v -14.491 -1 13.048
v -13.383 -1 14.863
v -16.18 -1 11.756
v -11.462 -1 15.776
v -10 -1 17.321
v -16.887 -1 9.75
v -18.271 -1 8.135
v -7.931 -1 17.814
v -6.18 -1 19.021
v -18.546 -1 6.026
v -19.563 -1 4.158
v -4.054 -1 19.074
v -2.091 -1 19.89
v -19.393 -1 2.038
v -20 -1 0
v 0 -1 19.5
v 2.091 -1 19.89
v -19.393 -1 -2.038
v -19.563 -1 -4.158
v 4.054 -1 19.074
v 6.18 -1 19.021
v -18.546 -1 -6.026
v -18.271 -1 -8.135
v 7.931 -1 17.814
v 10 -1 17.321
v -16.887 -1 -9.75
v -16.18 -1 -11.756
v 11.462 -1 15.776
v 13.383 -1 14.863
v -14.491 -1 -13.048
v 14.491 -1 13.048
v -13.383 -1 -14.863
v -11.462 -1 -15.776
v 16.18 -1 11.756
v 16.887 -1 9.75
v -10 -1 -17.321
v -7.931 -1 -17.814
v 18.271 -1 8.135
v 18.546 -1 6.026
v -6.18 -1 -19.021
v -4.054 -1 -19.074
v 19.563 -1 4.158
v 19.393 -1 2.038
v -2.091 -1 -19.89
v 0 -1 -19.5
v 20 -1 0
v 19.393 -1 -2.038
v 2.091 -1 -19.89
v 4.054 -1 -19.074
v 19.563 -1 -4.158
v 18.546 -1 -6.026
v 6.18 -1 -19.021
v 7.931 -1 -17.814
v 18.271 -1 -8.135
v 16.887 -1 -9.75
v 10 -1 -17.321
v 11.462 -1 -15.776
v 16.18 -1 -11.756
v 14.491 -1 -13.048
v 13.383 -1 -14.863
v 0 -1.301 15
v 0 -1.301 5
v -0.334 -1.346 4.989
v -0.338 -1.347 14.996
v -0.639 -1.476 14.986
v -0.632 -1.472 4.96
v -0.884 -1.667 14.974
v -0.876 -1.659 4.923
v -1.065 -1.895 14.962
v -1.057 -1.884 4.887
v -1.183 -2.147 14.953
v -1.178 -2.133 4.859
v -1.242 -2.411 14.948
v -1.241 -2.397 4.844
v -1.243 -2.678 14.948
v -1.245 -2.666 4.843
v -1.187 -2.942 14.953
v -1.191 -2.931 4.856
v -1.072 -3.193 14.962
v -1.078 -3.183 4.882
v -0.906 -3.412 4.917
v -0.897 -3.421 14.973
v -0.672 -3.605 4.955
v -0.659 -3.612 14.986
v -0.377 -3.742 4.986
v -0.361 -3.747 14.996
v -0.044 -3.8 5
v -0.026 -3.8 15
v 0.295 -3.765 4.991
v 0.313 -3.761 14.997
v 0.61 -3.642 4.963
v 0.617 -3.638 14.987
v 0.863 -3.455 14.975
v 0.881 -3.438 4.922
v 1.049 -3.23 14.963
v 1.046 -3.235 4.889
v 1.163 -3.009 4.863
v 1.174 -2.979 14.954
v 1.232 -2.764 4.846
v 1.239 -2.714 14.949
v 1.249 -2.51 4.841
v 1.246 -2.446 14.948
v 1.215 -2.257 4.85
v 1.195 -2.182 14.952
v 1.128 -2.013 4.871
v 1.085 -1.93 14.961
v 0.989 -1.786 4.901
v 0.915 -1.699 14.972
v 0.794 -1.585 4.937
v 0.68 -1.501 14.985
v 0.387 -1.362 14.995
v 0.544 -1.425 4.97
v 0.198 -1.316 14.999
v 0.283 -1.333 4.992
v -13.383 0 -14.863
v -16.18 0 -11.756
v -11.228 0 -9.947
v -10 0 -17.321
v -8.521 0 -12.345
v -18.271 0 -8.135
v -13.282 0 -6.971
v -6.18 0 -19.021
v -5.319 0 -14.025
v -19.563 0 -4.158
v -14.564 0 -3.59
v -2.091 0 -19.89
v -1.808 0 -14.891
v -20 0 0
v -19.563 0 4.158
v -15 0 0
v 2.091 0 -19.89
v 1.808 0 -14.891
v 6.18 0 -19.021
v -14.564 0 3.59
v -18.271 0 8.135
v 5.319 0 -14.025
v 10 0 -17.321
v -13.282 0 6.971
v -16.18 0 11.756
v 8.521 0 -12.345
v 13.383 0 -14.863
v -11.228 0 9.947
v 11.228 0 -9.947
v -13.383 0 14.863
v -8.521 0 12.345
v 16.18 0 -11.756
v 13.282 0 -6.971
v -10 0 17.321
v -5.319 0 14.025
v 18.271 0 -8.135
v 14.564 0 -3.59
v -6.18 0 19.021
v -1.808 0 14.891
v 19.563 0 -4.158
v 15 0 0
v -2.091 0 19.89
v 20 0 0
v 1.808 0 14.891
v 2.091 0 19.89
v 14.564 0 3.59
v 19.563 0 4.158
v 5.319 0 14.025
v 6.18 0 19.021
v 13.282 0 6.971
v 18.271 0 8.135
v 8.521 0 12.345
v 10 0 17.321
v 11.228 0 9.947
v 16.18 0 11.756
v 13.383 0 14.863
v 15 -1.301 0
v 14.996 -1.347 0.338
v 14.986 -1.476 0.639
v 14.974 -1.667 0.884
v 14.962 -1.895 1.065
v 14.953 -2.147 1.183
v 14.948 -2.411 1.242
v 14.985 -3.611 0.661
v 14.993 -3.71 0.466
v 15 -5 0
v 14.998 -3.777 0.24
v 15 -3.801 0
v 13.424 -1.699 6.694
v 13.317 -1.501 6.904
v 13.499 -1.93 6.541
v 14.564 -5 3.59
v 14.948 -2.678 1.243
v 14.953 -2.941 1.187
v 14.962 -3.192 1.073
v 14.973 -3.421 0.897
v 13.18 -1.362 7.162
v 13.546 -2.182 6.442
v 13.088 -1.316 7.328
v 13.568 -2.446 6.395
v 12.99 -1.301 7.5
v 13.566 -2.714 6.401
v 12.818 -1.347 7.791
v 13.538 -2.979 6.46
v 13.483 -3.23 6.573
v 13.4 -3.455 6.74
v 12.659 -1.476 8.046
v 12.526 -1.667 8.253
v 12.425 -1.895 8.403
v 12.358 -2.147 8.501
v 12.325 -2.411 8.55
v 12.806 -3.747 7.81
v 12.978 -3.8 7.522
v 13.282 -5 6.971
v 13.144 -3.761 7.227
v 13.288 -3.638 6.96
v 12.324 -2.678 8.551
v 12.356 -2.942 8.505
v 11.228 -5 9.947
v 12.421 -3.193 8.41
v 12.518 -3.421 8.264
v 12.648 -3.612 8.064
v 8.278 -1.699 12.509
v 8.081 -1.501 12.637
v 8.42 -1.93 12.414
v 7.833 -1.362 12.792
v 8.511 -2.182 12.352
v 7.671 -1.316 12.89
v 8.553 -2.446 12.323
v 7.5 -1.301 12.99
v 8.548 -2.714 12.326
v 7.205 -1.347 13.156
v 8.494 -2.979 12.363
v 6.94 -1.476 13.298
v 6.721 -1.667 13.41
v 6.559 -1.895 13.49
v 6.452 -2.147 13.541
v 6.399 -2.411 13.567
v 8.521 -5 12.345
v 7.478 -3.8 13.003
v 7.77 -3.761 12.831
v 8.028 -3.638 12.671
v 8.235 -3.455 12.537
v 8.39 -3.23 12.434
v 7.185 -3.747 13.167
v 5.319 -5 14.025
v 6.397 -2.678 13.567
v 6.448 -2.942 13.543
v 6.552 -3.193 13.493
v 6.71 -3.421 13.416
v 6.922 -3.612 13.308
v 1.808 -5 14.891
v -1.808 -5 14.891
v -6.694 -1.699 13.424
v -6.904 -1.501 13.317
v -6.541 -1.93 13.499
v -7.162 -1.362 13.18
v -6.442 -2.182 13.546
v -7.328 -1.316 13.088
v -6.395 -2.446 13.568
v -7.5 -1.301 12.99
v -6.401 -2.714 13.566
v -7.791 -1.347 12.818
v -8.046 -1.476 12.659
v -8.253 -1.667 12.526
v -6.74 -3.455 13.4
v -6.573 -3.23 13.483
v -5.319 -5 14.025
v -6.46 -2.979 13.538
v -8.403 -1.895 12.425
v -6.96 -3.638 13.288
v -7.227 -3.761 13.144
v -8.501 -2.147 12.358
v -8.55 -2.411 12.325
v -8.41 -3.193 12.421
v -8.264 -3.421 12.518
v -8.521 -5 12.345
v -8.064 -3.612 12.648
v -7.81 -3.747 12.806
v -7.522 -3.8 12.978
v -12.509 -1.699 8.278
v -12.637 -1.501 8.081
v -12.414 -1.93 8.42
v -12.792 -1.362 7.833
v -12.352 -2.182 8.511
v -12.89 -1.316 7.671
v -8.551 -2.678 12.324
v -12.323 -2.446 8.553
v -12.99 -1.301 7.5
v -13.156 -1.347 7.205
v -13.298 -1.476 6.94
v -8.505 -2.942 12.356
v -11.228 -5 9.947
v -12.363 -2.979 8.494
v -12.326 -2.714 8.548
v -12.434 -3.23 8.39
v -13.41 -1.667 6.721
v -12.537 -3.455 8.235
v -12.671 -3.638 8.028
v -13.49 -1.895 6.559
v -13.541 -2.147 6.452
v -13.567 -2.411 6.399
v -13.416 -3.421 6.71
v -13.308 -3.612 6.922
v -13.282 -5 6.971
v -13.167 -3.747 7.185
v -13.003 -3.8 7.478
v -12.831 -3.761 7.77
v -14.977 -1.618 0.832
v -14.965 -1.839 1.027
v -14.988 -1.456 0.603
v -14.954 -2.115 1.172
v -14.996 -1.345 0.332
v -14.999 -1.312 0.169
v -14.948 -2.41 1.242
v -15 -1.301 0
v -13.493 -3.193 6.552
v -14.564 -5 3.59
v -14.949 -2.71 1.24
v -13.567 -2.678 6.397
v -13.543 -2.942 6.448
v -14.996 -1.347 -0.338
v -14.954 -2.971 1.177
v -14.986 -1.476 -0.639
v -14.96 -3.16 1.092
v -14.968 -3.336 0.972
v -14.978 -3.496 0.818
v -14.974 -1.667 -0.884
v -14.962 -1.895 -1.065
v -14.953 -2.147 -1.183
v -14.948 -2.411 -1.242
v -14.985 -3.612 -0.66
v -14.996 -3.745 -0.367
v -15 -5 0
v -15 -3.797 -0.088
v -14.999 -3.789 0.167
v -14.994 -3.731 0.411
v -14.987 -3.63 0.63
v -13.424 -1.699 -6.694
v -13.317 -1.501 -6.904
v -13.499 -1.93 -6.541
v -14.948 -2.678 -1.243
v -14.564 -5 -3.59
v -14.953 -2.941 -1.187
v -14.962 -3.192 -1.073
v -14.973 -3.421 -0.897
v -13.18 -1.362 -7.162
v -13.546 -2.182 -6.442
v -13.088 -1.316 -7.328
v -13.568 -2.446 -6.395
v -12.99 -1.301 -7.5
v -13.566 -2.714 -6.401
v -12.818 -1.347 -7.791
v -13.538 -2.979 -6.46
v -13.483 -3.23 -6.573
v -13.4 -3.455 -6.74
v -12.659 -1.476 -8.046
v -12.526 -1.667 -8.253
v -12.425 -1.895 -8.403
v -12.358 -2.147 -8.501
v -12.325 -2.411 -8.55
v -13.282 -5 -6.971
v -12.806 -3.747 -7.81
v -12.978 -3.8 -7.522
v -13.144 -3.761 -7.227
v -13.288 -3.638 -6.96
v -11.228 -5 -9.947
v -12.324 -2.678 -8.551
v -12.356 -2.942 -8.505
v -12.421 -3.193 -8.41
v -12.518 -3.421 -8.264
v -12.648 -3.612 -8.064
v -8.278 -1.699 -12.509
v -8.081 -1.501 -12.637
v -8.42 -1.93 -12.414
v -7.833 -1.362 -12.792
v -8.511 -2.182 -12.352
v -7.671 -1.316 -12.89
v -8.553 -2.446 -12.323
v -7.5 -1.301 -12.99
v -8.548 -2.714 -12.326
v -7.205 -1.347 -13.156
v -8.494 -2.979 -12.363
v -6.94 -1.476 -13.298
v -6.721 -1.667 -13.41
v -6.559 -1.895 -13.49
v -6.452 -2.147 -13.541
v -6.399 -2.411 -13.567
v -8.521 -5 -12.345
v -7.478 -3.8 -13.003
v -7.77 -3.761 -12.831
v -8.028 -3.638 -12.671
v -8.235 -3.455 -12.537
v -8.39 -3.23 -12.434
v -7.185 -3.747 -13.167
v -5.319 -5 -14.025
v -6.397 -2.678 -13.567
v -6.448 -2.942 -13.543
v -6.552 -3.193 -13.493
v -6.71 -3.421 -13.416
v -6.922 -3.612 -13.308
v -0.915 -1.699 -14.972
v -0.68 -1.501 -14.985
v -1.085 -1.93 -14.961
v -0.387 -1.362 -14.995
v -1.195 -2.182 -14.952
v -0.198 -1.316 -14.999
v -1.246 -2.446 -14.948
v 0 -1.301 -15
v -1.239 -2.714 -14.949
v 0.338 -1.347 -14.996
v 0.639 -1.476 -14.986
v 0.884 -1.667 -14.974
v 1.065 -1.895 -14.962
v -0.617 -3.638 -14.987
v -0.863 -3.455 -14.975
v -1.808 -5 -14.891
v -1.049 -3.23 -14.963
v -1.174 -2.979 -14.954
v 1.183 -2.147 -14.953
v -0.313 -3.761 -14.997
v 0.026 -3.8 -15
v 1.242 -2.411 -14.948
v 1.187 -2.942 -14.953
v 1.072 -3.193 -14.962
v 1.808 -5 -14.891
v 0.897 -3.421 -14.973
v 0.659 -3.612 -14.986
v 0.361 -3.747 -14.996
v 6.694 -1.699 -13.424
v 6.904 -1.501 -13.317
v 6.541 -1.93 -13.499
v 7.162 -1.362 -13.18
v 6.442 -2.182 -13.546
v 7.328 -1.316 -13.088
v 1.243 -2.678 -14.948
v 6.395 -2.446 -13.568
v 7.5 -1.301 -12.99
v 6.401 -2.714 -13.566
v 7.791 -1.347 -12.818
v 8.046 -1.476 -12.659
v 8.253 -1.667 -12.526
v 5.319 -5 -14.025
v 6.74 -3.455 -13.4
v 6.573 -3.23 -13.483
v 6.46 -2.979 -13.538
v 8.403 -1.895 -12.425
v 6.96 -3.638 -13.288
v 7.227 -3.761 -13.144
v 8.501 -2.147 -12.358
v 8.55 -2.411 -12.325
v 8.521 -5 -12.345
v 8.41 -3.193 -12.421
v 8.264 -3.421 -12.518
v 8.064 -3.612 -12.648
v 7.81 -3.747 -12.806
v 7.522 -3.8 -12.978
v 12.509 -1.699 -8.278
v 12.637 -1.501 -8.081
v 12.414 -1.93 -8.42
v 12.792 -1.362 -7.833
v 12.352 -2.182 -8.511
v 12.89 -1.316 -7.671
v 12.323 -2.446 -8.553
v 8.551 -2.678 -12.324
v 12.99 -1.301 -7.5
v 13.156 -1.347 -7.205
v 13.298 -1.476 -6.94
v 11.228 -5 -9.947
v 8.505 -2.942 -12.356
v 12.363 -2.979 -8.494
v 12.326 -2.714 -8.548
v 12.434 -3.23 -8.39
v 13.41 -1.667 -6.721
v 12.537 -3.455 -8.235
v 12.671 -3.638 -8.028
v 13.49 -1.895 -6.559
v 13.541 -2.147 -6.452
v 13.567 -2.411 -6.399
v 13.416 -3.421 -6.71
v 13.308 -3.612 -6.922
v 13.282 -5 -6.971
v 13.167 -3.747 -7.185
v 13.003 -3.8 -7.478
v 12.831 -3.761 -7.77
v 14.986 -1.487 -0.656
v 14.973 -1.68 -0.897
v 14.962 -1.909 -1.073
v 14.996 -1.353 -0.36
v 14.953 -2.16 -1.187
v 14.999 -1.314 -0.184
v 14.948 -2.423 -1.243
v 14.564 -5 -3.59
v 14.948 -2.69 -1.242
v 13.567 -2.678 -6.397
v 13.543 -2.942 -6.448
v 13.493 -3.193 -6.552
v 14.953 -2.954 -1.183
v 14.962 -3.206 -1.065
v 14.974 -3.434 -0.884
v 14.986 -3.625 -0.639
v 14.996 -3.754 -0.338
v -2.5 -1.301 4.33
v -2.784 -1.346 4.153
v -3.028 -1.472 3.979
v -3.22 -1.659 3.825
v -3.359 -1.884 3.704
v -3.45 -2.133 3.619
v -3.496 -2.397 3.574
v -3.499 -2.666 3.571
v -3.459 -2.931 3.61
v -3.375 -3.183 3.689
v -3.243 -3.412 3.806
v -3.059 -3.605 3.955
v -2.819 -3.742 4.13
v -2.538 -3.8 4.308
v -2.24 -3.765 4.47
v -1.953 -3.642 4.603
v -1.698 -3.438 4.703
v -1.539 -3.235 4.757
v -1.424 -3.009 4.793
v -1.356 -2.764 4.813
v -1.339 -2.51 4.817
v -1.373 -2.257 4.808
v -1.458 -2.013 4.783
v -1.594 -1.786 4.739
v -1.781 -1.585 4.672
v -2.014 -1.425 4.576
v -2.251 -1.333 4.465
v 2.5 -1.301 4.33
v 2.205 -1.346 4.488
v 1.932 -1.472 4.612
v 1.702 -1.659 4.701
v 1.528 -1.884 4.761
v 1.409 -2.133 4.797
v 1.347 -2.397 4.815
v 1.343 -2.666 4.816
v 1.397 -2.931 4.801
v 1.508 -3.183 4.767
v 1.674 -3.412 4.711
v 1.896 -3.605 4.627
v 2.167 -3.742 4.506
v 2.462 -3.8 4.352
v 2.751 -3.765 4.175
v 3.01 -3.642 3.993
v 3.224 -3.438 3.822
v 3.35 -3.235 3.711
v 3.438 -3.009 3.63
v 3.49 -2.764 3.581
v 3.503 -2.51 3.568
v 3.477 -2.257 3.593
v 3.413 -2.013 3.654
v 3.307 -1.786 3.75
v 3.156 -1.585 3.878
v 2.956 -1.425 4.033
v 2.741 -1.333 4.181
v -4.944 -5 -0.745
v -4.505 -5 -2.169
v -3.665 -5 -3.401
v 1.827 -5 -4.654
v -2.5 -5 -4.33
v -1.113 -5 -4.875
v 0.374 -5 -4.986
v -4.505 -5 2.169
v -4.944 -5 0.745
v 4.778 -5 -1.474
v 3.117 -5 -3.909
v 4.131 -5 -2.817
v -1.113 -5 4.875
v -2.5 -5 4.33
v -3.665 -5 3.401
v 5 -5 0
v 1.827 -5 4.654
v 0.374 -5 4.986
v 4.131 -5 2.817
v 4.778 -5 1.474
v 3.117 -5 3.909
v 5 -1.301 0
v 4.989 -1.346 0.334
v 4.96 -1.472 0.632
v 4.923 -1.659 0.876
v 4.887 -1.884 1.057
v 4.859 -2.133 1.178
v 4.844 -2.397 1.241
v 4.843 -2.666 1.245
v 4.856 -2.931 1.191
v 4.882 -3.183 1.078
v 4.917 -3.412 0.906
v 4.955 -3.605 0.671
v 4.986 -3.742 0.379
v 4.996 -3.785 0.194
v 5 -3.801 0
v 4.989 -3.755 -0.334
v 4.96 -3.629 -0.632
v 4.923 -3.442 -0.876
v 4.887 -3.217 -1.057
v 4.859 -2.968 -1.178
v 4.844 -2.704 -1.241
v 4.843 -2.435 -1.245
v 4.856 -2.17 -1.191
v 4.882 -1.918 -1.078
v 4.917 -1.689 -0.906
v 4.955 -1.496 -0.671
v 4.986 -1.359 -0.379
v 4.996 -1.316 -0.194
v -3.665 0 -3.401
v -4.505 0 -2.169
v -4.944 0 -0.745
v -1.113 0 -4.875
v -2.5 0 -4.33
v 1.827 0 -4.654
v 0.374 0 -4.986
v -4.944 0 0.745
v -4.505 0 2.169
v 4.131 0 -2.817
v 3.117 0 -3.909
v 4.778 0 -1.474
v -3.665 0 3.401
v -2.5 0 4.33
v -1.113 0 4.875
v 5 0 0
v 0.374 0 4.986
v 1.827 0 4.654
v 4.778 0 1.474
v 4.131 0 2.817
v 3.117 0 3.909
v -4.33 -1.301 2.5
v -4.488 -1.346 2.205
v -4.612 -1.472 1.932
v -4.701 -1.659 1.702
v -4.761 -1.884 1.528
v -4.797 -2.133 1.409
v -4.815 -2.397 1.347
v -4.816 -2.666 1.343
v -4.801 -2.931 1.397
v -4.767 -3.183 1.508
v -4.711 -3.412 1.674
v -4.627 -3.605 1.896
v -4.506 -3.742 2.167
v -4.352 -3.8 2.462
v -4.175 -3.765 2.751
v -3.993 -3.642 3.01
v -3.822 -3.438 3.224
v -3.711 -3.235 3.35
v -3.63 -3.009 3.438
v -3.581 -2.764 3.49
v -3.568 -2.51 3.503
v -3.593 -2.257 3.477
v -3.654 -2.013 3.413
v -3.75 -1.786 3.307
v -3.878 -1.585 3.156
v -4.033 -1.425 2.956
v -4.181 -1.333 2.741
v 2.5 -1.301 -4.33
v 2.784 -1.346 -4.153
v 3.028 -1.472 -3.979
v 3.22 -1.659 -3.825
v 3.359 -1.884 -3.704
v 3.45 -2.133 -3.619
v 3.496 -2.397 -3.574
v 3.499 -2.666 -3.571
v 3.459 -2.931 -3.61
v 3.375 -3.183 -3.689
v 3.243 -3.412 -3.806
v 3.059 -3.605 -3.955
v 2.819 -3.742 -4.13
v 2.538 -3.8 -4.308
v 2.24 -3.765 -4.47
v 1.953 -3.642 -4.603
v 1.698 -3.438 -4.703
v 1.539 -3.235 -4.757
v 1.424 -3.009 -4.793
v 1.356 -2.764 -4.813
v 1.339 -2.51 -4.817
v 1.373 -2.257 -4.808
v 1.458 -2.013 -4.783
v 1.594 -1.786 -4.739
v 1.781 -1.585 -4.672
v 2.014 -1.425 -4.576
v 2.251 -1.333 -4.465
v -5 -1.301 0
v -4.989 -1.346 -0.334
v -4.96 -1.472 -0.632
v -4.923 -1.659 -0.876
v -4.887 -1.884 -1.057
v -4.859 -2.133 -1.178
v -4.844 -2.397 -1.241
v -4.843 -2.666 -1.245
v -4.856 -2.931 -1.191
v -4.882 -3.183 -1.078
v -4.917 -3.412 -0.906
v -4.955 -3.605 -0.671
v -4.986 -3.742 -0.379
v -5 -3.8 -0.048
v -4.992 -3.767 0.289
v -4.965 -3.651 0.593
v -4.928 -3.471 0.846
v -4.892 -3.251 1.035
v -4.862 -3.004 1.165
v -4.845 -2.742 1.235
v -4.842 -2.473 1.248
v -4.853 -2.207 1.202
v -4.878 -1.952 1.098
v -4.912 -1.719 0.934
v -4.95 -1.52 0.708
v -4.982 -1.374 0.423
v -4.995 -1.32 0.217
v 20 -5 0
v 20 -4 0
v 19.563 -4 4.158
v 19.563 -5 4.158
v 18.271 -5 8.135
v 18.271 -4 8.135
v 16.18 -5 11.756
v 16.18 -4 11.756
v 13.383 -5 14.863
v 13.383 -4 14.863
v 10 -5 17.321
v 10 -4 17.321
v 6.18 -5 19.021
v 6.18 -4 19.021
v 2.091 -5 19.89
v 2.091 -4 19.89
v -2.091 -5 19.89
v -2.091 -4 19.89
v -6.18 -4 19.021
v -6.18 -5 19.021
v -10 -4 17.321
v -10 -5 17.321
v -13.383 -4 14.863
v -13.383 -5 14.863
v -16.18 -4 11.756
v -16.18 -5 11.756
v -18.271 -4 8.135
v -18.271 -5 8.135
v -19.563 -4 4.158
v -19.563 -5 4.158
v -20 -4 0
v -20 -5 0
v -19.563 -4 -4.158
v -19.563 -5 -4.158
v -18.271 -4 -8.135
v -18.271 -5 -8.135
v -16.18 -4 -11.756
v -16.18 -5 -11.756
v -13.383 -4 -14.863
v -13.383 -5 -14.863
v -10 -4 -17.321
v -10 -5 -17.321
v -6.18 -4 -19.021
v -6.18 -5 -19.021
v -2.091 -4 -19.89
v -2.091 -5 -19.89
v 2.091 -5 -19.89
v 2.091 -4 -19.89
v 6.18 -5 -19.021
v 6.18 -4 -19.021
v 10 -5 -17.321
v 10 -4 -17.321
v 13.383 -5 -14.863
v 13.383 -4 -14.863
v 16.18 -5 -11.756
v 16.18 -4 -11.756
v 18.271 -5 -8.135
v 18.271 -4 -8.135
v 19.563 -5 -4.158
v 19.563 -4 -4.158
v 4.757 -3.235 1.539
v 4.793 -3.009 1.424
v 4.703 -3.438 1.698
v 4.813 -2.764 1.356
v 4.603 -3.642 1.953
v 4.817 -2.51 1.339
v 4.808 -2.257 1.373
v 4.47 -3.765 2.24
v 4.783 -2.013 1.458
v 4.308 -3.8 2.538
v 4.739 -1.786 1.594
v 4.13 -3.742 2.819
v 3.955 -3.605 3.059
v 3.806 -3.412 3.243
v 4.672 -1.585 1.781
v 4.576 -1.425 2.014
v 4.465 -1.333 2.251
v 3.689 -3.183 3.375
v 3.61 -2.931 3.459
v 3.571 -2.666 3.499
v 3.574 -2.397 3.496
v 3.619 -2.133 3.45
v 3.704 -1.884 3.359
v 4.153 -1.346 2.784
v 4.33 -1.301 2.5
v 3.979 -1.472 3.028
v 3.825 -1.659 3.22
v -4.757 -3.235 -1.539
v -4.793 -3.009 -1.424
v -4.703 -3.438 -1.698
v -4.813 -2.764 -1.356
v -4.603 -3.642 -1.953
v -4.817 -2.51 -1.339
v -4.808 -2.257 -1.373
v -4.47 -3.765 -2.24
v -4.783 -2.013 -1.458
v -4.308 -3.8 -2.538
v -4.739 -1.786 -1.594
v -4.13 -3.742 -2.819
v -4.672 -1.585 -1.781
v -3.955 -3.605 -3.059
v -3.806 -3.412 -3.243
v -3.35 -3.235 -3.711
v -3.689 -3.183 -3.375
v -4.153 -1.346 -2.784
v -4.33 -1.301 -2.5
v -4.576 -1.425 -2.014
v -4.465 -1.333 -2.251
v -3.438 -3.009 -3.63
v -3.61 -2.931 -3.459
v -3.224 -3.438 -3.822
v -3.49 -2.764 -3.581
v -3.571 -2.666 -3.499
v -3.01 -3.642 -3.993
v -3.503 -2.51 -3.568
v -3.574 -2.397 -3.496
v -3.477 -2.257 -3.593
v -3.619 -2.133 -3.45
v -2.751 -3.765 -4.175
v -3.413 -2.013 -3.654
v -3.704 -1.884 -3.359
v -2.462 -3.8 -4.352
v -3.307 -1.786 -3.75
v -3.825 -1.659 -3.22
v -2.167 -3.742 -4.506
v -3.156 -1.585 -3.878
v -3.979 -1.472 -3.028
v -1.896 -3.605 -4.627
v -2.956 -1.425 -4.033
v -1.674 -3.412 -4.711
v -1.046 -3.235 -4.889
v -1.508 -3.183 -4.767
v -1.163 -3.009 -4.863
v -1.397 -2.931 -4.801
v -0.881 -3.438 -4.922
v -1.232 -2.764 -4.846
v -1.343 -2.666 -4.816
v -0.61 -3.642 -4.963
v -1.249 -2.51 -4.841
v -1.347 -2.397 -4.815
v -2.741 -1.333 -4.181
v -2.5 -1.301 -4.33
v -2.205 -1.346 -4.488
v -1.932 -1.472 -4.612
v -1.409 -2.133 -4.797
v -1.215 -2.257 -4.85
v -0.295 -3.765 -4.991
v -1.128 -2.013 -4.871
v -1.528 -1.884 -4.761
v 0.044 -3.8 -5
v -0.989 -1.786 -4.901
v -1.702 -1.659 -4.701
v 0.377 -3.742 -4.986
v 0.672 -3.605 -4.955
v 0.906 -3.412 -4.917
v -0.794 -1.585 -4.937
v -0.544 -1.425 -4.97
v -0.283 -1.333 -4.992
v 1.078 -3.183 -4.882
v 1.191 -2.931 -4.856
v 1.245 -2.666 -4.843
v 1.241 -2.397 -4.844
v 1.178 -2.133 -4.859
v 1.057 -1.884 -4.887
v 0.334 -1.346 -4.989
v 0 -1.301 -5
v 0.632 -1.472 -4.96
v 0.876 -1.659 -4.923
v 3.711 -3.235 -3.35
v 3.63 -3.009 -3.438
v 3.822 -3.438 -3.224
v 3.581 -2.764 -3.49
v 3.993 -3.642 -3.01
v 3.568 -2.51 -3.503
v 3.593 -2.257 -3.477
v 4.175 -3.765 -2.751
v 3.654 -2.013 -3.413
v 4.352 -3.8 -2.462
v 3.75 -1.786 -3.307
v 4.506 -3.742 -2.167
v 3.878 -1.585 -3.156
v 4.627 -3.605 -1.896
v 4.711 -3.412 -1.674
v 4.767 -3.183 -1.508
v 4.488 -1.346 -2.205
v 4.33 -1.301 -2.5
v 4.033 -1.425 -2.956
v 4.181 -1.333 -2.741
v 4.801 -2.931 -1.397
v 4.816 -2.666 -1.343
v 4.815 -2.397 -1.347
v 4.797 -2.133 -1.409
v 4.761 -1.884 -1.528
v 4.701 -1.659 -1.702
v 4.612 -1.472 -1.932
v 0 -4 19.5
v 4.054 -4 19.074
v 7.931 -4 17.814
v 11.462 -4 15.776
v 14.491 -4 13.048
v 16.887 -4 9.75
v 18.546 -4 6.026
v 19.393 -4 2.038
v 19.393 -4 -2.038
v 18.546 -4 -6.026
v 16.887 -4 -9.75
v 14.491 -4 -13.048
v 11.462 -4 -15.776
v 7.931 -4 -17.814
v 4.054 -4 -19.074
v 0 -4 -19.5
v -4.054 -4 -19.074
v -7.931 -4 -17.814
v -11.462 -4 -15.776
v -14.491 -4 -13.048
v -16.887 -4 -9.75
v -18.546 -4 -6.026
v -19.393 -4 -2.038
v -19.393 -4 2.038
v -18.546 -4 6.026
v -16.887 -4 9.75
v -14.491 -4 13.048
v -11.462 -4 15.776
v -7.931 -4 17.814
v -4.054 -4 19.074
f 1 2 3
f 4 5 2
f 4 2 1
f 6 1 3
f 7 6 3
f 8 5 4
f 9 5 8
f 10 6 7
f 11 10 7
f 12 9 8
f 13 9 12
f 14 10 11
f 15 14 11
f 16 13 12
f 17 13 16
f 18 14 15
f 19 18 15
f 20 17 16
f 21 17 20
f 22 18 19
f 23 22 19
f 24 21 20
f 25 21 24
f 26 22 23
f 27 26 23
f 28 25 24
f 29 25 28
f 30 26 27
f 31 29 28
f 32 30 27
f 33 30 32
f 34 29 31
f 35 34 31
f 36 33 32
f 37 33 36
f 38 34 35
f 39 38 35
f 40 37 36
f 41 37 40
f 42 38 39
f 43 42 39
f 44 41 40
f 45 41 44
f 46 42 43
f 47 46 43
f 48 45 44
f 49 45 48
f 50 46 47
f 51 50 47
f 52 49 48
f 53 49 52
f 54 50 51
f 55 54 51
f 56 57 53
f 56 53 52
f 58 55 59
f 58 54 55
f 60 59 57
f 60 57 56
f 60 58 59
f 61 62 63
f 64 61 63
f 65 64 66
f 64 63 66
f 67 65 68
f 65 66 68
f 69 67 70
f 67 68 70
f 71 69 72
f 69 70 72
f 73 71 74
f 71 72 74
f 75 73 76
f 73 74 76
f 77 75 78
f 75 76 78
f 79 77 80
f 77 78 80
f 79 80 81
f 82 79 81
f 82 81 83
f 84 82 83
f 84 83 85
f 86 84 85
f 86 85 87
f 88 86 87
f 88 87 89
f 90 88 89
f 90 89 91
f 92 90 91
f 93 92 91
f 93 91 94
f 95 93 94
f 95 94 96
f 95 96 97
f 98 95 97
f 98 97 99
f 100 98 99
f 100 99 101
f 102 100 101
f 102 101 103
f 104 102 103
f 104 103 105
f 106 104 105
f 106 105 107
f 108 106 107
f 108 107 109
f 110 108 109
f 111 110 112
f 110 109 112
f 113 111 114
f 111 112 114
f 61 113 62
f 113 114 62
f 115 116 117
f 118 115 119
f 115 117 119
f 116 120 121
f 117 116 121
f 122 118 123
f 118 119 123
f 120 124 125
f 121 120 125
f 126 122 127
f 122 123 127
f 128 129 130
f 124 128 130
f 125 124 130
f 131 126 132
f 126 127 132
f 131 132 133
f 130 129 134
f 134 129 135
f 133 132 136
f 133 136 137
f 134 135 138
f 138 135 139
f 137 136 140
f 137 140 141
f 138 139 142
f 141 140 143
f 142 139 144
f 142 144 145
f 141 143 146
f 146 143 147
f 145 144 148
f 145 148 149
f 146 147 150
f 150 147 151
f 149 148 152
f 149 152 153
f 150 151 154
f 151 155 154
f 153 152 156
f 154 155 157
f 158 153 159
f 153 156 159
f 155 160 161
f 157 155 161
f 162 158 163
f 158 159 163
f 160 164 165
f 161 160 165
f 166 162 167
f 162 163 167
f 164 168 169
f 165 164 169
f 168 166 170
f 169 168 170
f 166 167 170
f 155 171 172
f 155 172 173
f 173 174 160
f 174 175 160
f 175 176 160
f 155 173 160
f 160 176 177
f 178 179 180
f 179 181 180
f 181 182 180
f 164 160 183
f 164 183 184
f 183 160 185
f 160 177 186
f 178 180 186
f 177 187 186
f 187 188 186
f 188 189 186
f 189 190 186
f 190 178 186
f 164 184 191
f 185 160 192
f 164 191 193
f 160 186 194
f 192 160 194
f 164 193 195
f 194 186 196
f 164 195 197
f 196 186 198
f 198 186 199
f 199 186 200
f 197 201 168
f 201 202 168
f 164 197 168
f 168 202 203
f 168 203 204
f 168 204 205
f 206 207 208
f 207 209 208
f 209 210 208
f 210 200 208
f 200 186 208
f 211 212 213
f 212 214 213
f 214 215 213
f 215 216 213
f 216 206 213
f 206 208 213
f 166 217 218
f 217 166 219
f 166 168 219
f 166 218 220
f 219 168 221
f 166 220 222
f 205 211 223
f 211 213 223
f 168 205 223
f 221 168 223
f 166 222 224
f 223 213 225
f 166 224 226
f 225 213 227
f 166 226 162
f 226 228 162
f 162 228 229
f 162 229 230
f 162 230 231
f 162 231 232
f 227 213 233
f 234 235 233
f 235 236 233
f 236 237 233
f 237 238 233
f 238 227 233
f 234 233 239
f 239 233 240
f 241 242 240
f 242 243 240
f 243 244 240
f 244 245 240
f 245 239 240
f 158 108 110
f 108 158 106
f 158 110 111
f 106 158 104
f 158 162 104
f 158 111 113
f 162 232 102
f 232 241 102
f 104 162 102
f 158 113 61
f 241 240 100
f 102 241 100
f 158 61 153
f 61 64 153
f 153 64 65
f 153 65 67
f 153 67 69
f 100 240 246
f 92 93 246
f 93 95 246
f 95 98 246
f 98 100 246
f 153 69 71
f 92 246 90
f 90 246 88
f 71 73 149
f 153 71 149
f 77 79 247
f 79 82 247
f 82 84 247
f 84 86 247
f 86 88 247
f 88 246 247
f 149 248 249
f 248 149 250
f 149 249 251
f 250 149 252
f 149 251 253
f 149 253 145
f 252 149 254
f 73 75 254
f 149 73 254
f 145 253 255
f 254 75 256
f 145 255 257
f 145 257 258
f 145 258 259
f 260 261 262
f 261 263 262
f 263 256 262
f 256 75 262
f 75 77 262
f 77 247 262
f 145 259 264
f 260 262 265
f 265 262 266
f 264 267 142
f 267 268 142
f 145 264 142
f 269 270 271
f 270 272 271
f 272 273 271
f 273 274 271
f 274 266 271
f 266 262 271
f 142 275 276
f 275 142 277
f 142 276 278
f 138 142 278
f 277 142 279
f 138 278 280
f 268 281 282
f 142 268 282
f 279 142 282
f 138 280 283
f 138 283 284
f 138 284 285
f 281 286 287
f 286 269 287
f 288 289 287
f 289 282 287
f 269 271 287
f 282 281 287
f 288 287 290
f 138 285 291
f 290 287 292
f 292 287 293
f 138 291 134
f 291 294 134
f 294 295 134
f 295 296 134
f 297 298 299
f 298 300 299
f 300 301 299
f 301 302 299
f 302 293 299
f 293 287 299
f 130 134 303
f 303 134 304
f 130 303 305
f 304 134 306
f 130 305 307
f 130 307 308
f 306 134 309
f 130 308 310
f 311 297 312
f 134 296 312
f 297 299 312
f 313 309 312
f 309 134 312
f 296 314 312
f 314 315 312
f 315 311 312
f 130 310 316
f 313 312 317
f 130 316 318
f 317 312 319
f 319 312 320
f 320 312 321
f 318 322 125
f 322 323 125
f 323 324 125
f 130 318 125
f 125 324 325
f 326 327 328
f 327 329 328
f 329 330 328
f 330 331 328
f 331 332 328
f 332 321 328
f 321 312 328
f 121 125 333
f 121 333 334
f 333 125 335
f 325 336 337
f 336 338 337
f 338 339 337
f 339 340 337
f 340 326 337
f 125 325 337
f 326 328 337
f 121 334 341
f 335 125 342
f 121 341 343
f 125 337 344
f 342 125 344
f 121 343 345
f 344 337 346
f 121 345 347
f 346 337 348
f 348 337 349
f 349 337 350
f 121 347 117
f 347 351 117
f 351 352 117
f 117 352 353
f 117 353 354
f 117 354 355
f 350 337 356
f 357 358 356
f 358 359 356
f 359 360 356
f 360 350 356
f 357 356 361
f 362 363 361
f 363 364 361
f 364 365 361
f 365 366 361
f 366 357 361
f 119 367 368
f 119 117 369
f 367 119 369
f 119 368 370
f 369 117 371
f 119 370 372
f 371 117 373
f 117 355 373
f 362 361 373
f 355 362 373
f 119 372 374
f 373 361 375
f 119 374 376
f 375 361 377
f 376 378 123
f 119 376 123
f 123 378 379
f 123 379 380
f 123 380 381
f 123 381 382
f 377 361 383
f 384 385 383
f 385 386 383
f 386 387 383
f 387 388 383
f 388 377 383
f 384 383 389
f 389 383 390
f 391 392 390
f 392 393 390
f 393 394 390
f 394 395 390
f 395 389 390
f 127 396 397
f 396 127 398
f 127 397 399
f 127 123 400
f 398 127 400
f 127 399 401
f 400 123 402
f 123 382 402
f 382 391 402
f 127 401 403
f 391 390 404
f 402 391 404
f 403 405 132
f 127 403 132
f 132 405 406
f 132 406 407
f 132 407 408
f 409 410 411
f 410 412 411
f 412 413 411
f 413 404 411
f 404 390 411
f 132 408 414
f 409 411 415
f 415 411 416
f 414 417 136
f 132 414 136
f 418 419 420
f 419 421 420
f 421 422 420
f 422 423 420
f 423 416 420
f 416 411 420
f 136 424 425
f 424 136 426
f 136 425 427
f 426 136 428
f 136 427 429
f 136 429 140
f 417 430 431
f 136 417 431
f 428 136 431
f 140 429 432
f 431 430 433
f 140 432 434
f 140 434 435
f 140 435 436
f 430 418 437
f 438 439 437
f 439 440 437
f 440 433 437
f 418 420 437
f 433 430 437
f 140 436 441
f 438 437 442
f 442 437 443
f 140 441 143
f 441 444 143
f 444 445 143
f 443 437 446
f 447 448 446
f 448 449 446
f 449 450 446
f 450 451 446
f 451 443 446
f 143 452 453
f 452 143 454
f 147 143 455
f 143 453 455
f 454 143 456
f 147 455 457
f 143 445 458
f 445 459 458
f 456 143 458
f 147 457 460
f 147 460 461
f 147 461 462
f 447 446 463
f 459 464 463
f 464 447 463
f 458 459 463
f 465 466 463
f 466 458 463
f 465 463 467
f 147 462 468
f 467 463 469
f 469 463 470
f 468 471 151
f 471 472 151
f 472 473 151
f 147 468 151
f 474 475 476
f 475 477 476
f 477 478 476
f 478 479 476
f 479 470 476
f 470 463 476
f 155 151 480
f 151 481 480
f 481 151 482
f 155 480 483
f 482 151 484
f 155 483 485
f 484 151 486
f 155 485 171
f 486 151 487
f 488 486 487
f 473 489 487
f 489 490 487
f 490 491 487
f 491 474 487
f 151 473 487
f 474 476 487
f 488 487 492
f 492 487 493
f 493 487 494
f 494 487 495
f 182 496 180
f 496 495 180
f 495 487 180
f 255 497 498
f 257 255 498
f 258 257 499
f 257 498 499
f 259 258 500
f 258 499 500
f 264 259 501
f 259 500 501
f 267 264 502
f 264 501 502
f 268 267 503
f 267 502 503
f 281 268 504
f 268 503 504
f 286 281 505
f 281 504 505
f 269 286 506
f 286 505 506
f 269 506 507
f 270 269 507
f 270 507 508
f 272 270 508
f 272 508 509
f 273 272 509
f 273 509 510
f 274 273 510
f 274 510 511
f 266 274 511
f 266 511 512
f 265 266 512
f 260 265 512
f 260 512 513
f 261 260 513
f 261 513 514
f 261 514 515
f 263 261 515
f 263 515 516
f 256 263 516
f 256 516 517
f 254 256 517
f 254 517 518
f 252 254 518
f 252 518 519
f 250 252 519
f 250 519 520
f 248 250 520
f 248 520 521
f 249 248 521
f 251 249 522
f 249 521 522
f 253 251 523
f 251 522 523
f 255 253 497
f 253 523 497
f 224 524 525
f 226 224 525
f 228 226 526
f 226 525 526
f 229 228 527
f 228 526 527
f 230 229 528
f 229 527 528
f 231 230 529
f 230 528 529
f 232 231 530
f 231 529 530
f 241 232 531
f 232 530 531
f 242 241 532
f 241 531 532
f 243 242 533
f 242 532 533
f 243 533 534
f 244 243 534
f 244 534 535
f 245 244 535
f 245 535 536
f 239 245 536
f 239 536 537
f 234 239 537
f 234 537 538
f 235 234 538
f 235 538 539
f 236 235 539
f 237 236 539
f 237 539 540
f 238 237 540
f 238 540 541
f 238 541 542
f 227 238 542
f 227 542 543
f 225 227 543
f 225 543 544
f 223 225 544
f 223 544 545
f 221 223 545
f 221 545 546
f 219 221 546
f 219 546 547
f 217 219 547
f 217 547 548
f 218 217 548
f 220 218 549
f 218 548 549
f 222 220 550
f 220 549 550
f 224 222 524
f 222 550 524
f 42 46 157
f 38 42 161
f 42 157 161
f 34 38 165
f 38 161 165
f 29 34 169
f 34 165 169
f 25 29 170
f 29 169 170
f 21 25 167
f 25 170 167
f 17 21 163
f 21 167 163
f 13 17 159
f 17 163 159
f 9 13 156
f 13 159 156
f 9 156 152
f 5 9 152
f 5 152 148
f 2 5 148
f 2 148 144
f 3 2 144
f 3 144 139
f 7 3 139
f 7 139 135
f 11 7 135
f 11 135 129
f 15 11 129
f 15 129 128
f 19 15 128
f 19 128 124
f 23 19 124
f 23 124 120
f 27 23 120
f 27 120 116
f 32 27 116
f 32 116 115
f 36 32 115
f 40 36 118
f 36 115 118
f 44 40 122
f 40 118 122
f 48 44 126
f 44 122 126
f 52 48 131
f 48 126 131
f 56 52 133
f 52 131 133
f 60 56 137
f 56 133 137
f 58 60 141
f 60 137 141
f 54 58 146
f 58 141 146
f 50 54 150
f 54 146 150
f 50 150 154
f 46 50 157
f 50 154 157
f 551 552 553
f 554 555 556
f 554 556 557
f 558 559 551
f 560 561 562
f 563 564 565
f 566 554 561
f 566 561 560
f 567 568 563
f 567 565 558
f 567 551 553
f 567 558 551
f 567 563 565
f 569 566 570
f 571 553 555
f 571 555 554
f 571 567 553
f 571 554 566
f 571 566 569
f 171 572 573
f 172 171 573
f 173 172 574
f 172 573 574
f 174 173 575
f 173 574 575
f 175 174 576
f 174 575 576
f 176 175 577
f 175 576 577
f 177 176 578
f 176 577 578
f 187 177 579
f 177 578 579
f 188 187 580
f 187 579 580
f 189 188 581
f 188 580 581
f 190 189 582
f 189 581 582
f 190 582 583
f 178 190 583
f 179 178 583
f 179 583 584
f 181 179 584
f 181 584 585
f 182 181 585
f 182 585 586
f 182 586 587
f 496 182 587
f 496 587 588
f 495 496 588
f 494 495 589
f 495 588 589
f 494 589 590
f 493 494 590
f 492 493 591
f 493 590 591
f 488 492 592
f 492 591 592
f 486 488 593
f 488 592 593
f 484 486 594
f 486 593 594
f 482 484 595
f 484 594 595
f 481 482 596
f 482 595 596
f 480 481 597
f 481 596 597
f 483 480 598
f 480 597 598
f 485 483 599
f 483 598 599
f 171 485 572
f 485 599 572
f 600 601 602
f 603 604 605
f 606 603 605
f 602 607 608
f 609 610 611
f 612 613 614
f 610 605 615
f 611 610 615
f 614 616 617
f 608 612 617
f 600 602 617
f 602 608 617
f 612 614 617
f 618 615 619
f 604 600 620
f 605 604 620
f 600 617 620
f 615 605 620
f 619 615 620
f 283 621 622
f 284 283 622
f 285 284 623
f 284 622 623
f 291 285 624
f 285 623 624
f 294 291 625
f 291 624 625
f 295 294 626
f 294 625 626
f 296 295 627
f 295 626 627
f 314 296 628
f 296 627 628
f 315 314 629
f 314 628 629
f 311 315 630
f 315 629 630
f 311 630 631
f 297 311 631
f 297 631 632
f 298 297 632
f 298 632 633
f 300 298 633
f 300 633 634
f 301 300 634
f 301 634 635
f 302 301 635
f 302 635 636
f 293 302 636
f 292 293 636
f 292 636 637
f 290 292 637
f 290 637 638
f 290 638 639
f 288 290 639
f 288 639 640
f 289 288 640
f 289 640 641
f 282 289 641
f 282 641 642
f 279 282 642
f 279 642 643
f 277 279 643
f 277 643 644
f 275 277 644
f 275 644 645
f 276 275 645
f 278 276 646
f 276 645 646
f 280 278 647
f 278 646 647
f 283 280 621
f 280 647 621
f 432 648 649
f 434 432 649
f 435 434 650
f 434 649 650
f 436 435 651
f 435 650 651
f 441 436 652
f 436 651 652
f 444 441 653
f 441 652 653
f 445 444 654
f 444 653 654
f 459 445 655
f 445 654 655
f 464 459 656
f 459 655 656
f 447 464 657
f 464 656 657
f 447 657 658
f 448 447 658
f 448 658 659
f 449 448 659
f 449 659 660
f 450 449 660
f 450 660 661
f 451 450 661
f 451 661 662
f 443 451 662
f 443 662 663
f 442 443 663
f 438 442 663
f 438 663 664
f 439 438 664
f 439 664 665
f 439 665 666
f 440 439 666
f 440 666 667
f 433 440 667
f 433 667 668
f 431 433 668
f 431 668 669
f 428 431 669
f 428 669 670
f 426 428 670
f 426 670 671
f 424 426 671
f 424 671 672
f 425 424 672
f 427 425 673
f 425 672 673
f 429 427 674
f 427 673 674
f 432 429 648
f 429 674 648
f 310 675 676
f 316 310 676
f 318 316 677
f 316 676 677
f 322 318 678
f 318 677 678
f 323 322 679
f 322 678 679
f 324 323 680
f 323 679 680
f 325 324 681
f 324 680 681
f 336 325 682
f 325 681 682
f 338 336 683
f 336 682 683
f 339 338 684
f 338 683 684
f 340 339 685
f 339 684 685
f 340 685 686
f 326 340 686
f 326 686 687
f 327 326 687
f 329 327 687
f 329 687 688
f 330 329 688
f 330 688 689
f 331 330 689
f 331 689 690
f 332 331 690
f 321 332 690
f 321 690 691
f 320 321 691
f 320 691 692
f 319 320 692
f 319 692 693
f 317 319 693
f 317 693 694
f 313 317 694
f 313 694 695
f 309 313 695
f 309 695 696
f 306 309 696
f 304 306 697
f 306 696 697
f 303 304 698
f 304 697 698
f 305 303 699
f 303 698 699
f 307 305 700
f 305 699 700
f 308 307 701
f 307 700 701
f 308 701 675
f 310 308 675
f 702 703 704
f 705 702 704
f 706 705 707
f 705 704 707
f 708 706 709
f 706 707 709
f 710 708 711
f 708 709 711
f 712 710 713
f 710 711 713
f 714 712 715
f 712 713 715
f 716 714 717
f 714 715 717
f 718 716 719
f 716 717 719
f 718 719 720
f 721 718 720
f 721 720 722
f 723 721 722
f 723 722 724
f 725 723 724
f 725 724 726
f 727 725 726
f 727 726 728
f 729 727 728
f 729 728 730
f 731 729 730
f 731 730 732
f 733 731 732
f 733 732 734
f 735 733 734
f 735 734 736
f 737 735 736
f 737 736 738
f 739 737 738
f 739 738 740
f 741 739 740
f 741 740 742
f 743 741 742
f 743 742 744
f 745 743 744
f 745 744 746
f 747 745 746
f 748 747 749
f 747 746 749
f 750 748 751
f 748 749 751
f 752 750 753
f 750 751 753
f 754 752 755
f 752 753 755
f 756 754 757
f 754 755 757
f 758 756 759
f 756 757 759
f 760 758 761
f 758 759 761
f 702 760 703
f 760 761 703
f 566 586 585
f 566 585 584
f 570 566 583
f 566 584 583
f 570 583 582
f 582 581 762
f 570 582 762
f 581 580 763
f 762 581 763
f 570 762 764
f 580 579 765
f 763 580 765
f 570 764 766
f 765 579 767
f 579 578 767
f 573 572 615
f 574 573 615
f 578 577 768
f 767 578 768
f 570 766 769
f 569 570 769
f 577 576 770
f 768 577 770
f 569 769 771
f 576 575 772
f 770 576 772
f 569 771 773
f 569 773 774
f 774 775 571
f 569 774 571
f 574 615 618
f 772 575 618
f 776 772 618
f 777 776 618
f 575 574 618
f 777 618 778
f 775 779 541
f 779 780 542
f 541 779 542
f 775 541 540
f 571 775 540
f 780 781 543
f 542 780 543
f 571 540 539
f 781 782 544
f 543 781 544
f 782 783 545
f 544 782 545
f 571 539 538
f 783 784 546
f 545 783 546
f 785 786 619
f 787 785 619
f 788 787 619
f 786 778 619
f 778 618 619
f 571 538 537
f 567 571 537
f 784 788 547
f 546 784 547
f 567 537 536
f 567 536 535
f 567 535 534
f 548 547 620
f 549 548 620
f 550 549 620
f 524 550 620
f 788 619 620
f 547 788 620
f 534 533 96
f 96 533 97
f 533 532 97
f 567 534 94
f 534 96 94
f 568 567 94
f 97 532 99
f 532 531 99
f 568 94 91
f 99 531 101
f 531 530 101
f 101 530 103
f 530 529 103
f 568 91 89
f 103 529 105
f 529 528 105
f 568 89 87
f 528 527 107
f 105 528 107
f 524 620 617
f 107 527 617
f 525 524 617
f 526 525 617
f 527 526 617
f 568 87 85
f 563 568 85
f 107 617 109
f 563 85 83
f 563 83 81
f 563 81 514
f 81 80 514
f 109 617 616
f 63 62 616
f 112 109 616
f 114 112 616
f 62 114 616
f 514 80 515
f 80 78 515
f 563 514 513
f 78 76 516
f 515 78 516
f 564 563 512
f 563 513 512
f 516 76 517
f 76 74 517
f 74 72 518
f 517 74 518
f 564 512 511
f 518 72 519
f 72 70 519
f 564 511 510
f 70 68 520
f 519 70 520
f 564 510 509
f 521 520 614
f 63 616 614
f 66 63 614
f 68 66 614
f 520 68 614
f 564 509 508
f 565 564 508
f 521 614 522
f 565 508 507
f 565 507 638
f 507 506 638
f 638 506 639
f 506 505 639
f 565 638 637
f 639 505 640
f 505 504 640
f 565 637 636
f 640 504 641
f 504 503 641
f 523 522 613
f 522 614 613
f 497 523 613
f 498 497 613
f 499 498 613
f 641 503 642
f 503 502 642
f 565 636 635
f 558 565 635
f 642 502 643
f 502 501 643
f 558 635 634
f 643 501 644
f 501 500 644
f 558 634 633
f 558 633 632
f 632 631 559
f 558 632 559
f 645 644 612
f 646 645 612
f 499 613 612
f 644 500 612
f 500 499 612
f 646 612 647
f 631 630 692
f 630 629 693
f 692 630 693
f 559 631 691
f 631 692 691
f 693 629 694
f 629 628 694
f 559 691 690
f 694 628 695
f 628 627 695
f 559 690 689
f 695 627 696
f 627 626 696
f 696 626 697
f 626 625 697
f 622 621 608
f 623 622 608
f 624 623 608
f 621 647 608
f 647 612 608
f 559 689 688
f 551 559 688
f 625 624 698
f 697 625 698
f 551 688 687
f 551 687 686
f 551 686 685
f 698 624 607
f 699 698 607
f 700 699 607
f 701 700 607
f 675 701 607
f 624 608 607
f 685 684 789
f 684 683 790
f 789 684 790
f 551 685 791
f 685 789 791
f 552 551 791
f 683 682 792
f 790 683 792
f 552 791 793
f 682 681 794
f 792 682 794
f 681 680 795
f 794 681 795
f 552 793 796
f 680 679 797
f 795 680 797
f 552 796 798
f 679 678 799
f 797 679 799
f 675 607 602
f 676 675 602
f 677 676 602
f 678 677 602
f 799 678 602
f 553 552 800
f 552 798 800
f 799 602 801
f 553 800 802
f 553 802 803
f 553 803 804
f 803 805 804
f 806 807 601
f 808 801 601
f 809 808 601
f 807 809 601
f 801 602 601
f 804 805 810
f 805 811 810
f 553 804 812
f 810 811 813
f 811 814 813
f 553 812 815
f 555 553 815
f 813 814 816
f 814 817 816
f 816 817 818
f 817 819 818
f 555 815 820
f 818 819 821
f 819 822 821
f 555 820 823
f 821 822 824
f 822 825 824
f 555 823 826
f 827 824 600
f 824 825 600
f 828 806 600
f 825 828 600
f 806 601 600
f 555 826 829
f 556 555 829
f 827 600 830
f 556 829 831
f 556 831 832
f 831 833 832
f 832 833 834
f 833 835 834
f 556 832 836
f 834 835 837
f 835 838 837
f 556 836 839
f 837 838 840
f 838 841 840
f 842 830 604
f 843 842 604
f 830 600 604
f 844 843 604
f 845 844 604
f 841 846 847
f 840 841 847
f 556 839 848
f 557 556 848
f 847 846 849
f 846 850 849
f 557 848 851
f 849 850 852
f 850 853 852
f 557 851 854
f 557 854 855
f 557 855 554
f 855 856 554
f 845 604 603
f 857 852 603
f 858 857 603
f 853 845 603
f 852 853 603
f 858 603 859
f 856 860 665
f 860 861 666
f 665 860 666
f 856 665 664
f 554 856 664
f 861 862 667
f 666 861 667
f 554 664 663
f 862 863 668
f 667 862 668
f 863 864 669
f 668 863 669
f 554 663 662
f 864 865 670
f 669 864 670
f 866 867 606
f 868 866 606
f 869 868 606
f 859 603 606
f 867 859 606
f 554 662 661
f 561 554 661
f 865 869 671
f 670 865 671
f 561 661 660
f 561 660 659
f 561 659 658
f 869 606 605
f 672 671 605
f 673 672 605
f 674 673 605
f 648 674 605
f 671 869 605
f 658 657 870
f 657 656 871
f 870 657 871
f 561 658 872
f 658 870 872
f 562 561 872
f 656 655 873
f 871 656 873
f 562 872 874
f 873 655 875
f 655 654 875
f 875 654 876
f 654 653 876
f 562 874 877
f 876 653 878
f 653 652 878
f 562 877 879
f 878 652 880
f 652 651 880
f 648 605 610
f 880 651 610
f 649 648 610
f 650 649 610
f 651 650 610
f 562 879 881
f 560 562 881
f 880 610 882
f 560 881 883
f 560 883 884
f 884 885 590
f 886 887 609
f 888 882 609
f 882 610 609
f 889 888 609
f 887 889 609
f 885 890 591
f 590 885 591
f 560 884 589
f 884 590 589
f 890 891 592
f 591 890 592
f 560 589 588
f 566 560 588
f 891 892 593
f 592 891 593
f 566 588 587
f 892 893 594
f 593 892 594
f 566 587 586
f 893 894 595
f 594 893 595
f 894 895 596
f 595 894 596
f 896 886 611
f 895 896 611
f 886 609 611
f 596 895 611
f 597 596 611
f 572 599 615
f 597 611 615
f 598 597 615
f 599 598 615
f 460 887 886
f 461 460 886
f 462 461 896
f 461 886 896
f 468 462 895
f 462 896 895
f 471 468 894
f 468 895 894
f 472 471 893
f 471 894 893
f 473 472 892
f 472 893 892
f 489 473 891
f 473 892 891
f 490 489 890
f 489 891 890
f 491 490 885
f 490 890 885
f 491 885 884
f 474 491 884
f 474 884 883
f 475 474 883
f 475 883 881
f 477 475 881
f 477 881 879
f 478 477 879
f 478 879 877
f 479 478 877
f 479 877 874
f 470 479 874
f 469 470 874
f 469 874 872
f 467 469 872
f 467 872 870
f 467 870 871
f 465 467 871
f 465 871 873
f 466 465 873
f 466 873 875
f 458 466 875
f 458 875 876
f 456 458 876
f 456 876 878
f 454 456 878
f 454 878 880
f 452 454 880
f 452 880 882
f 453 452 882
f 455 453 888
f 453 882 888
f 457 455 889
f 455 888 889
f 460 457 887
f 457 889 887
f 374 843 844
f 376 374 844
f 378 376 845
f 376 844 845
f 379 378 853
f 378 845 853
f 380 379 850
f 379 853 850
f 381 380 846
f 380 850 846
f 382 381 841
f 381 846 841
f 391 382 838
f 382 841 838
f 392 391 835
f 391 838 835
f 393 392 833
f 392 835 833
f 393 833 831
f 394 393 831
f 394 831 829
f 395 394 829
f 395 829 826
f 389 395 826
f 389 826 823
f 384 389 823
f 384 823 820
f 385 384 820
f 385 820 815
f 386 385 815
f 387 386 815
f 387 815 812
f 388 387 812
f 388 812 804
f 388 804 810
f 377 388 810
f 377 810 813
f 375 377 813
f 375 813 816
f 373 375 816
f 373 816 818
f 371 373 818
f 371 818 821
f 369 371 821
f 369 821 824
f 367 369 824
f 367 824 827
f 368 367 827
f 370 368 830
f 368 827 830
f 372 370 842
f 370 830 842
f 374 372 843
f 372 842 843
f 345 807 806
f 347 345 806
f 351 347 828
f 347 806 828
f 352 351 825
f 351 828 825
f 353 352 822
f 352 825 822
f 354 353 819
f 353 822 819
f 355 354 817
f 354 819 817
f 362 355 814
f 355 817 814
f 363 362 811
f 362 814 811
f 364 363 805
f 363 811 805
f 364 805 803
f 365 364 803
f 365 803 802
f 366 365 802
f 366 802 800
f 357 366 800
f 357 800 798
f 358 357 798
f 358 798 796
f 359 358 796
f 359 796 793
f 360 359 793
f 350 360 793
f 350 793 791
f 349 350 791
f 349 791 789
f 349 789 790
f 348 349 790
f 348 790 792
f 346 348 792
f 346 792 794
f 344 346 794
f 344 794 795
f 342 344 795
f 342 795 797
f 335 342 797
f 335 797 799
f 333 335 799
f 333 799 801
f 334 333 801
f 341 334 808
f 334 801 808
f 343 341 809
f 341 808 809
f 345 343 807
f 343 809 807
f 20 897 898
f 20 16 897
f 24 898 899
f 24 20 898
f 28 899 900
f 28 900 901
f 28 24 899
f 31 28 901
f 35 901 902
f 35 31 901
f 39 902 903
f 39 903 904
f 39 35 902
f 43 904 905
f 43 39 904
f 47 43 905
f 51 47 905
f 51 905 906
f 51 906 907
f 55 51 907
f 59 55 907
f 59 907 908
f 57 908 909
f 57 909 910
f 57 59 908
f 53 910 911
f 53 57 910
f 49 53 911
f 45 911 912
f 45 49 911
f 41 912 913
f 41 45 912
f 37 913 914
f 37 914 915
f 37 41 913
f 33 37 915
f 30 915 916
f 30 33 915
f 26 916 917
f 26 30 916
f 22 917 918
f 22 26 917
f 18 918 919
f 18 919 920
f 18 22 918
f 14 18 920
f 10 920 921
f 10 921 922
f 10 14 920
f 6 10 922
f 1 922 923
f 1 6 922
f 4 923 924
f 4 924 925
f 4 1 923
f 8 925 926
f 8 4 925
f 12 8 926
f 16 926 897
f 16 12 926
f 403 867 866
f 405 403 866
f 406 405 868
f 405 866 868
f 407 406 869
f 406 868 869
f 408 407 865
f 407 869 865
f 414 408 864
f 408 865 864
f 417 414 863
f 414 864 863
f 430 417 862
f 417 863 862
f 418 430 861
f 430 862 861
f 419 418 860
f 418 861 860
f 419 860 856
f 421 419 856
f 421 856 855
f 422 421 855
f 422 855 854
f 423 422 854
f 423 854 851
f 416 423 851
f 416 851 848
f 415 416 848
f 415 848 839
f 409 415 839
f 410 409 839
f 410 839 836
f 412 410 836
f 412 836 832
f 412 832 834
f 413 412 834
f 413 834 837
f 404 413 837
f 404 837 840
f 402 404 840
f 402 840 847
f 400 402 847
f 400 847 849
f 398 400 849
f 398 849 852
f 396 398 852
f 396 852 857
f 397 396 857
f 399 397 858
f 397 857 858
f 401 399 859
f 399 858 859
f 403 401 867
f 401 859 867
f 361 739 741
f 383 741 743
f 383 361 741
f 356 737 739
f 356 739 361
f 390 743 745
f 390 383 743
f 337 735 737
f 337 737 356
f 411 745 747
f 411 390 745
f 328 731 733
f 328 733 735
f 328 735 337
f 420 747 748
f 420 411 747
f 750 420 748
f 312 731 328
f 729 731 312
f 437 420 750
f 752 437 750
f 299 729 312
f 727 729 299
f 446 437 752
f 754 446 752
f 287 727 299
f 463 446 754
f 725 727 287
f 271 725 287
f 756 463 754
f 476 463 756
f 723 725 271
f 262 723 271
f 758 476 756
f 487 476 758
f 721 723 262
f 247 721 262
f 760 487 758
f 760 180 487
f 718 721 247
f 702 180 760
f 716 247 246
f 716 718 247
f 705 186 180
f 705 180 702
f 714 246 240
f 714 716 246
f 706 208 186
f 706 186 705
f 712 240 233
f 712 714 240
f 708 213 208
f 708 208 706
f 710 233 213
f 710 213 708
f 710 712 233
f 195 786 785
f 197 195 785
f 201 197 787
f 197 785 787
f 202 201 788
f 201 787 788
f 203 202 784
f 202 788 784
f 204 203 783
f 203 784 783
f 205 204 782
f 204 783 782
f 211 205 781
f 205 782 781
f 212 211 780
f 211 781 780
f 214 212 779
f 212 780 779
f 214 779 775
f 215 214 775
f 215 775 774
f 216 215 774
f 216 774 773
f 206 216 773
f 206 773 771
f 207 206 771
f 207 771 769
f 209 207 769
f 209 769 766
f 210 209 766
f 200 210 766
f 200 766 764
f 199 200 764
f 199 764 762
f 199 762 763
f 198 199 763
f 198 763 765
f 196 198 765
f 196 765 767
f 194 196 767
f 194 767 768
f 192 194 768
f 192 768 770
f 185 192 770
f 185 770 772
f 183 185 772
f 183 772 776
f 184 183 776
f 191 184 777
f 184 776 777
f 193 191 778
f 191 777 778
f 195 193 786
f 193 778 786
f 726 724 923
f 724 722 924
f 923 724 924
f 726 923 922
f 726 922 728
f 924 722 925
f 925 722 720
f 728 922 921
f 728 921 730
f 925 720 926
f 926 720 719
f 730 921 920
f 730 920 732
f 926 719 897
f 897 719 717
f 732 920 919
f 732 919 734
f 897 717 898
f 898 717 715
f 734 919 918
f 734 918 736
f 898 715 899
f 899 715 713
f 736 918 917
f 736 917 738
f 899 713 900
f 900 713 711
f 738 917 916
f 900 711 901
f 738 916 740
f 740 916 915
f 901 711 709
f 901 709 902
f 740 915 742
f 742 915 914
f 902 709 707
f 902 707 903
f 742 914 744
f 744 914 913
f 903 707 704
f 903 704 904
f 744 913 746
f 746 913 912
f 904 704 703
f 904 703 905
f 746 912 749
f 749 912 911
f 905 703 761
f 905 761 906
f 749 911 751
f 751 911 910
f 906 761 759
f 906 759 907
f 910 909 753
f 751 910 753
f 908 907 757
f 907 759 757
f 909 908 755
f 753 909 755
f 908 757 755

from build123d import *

# Parameters (mm, degrees)
F0_R            = 20
F1_DEPTH        = 5
F2_R            = 15
F3_DEPTH        = 5
F4_R            = 5
F5_DEPTH        = 5
F6_R            = 1.25
F7_DEPTH        = 19
F7_COPIES_COUNT = 12
F8_W            = 3
F8_H            = 0.5


# Not quite as in the source:
# - a pattern or mirror of a feature is missing from the dataset's text; its kind, count and spacing are read off the source's solid


with BuildPart() as f1:
    # F0 (on Front) → F1 (new body)
    with BuildSketch(Plane.XZ):
        Circle(F0_R)
    extrude(amount=F1_DEPTH)

    # F2 (on face) → F3 (cut)
    with BuildSketch(Plane.XZ.offset(5)):
        Circle(F2_R)
    extrude(amount=-F3_DEPTH, mode=Mode.SUBTRACT)



with BuildPart() as f5:
    # F4 (on Front) → F5 (new body)
    with BuildSketch(Plane.XZ):
        Circle(F4_R)
    extrude(amount=F5_DEPTH)


with BuildPart() as f1_1:
    add(f1.part)

    add(f5.part)  # F7 merges F5
    # F6 (on Right) → F7 (join)
    with BuildSketch(Plane.YZ):
        with Locations((-2.5505366686, 0)):
            Circle(F6_R)
    f7 = extrude(amount=F7_DEPTH)

    # F7_copies: F7 ×12 about axis
    f7_copies_axis = Axis((0, 0, 0), (0, 1, 0))
    for i in range(1, F7_COPIES_COUNT):
        add(f7.rotate(f7_copies_axis, i * 360 / F7_COPIES_COUNT))

    # F8 (on Right) → F9 (revolve, cut)
    with BuildSketch(Plane.YZ):
        with Locations((-2.5, 19.75)):
            Rectangle(F8_W, F8_H)
    revolve(axis=Axis((0, 0, 0), (0, 1, 0)), mode=Mode.SUBTRACT)


solid = f1_1.part
